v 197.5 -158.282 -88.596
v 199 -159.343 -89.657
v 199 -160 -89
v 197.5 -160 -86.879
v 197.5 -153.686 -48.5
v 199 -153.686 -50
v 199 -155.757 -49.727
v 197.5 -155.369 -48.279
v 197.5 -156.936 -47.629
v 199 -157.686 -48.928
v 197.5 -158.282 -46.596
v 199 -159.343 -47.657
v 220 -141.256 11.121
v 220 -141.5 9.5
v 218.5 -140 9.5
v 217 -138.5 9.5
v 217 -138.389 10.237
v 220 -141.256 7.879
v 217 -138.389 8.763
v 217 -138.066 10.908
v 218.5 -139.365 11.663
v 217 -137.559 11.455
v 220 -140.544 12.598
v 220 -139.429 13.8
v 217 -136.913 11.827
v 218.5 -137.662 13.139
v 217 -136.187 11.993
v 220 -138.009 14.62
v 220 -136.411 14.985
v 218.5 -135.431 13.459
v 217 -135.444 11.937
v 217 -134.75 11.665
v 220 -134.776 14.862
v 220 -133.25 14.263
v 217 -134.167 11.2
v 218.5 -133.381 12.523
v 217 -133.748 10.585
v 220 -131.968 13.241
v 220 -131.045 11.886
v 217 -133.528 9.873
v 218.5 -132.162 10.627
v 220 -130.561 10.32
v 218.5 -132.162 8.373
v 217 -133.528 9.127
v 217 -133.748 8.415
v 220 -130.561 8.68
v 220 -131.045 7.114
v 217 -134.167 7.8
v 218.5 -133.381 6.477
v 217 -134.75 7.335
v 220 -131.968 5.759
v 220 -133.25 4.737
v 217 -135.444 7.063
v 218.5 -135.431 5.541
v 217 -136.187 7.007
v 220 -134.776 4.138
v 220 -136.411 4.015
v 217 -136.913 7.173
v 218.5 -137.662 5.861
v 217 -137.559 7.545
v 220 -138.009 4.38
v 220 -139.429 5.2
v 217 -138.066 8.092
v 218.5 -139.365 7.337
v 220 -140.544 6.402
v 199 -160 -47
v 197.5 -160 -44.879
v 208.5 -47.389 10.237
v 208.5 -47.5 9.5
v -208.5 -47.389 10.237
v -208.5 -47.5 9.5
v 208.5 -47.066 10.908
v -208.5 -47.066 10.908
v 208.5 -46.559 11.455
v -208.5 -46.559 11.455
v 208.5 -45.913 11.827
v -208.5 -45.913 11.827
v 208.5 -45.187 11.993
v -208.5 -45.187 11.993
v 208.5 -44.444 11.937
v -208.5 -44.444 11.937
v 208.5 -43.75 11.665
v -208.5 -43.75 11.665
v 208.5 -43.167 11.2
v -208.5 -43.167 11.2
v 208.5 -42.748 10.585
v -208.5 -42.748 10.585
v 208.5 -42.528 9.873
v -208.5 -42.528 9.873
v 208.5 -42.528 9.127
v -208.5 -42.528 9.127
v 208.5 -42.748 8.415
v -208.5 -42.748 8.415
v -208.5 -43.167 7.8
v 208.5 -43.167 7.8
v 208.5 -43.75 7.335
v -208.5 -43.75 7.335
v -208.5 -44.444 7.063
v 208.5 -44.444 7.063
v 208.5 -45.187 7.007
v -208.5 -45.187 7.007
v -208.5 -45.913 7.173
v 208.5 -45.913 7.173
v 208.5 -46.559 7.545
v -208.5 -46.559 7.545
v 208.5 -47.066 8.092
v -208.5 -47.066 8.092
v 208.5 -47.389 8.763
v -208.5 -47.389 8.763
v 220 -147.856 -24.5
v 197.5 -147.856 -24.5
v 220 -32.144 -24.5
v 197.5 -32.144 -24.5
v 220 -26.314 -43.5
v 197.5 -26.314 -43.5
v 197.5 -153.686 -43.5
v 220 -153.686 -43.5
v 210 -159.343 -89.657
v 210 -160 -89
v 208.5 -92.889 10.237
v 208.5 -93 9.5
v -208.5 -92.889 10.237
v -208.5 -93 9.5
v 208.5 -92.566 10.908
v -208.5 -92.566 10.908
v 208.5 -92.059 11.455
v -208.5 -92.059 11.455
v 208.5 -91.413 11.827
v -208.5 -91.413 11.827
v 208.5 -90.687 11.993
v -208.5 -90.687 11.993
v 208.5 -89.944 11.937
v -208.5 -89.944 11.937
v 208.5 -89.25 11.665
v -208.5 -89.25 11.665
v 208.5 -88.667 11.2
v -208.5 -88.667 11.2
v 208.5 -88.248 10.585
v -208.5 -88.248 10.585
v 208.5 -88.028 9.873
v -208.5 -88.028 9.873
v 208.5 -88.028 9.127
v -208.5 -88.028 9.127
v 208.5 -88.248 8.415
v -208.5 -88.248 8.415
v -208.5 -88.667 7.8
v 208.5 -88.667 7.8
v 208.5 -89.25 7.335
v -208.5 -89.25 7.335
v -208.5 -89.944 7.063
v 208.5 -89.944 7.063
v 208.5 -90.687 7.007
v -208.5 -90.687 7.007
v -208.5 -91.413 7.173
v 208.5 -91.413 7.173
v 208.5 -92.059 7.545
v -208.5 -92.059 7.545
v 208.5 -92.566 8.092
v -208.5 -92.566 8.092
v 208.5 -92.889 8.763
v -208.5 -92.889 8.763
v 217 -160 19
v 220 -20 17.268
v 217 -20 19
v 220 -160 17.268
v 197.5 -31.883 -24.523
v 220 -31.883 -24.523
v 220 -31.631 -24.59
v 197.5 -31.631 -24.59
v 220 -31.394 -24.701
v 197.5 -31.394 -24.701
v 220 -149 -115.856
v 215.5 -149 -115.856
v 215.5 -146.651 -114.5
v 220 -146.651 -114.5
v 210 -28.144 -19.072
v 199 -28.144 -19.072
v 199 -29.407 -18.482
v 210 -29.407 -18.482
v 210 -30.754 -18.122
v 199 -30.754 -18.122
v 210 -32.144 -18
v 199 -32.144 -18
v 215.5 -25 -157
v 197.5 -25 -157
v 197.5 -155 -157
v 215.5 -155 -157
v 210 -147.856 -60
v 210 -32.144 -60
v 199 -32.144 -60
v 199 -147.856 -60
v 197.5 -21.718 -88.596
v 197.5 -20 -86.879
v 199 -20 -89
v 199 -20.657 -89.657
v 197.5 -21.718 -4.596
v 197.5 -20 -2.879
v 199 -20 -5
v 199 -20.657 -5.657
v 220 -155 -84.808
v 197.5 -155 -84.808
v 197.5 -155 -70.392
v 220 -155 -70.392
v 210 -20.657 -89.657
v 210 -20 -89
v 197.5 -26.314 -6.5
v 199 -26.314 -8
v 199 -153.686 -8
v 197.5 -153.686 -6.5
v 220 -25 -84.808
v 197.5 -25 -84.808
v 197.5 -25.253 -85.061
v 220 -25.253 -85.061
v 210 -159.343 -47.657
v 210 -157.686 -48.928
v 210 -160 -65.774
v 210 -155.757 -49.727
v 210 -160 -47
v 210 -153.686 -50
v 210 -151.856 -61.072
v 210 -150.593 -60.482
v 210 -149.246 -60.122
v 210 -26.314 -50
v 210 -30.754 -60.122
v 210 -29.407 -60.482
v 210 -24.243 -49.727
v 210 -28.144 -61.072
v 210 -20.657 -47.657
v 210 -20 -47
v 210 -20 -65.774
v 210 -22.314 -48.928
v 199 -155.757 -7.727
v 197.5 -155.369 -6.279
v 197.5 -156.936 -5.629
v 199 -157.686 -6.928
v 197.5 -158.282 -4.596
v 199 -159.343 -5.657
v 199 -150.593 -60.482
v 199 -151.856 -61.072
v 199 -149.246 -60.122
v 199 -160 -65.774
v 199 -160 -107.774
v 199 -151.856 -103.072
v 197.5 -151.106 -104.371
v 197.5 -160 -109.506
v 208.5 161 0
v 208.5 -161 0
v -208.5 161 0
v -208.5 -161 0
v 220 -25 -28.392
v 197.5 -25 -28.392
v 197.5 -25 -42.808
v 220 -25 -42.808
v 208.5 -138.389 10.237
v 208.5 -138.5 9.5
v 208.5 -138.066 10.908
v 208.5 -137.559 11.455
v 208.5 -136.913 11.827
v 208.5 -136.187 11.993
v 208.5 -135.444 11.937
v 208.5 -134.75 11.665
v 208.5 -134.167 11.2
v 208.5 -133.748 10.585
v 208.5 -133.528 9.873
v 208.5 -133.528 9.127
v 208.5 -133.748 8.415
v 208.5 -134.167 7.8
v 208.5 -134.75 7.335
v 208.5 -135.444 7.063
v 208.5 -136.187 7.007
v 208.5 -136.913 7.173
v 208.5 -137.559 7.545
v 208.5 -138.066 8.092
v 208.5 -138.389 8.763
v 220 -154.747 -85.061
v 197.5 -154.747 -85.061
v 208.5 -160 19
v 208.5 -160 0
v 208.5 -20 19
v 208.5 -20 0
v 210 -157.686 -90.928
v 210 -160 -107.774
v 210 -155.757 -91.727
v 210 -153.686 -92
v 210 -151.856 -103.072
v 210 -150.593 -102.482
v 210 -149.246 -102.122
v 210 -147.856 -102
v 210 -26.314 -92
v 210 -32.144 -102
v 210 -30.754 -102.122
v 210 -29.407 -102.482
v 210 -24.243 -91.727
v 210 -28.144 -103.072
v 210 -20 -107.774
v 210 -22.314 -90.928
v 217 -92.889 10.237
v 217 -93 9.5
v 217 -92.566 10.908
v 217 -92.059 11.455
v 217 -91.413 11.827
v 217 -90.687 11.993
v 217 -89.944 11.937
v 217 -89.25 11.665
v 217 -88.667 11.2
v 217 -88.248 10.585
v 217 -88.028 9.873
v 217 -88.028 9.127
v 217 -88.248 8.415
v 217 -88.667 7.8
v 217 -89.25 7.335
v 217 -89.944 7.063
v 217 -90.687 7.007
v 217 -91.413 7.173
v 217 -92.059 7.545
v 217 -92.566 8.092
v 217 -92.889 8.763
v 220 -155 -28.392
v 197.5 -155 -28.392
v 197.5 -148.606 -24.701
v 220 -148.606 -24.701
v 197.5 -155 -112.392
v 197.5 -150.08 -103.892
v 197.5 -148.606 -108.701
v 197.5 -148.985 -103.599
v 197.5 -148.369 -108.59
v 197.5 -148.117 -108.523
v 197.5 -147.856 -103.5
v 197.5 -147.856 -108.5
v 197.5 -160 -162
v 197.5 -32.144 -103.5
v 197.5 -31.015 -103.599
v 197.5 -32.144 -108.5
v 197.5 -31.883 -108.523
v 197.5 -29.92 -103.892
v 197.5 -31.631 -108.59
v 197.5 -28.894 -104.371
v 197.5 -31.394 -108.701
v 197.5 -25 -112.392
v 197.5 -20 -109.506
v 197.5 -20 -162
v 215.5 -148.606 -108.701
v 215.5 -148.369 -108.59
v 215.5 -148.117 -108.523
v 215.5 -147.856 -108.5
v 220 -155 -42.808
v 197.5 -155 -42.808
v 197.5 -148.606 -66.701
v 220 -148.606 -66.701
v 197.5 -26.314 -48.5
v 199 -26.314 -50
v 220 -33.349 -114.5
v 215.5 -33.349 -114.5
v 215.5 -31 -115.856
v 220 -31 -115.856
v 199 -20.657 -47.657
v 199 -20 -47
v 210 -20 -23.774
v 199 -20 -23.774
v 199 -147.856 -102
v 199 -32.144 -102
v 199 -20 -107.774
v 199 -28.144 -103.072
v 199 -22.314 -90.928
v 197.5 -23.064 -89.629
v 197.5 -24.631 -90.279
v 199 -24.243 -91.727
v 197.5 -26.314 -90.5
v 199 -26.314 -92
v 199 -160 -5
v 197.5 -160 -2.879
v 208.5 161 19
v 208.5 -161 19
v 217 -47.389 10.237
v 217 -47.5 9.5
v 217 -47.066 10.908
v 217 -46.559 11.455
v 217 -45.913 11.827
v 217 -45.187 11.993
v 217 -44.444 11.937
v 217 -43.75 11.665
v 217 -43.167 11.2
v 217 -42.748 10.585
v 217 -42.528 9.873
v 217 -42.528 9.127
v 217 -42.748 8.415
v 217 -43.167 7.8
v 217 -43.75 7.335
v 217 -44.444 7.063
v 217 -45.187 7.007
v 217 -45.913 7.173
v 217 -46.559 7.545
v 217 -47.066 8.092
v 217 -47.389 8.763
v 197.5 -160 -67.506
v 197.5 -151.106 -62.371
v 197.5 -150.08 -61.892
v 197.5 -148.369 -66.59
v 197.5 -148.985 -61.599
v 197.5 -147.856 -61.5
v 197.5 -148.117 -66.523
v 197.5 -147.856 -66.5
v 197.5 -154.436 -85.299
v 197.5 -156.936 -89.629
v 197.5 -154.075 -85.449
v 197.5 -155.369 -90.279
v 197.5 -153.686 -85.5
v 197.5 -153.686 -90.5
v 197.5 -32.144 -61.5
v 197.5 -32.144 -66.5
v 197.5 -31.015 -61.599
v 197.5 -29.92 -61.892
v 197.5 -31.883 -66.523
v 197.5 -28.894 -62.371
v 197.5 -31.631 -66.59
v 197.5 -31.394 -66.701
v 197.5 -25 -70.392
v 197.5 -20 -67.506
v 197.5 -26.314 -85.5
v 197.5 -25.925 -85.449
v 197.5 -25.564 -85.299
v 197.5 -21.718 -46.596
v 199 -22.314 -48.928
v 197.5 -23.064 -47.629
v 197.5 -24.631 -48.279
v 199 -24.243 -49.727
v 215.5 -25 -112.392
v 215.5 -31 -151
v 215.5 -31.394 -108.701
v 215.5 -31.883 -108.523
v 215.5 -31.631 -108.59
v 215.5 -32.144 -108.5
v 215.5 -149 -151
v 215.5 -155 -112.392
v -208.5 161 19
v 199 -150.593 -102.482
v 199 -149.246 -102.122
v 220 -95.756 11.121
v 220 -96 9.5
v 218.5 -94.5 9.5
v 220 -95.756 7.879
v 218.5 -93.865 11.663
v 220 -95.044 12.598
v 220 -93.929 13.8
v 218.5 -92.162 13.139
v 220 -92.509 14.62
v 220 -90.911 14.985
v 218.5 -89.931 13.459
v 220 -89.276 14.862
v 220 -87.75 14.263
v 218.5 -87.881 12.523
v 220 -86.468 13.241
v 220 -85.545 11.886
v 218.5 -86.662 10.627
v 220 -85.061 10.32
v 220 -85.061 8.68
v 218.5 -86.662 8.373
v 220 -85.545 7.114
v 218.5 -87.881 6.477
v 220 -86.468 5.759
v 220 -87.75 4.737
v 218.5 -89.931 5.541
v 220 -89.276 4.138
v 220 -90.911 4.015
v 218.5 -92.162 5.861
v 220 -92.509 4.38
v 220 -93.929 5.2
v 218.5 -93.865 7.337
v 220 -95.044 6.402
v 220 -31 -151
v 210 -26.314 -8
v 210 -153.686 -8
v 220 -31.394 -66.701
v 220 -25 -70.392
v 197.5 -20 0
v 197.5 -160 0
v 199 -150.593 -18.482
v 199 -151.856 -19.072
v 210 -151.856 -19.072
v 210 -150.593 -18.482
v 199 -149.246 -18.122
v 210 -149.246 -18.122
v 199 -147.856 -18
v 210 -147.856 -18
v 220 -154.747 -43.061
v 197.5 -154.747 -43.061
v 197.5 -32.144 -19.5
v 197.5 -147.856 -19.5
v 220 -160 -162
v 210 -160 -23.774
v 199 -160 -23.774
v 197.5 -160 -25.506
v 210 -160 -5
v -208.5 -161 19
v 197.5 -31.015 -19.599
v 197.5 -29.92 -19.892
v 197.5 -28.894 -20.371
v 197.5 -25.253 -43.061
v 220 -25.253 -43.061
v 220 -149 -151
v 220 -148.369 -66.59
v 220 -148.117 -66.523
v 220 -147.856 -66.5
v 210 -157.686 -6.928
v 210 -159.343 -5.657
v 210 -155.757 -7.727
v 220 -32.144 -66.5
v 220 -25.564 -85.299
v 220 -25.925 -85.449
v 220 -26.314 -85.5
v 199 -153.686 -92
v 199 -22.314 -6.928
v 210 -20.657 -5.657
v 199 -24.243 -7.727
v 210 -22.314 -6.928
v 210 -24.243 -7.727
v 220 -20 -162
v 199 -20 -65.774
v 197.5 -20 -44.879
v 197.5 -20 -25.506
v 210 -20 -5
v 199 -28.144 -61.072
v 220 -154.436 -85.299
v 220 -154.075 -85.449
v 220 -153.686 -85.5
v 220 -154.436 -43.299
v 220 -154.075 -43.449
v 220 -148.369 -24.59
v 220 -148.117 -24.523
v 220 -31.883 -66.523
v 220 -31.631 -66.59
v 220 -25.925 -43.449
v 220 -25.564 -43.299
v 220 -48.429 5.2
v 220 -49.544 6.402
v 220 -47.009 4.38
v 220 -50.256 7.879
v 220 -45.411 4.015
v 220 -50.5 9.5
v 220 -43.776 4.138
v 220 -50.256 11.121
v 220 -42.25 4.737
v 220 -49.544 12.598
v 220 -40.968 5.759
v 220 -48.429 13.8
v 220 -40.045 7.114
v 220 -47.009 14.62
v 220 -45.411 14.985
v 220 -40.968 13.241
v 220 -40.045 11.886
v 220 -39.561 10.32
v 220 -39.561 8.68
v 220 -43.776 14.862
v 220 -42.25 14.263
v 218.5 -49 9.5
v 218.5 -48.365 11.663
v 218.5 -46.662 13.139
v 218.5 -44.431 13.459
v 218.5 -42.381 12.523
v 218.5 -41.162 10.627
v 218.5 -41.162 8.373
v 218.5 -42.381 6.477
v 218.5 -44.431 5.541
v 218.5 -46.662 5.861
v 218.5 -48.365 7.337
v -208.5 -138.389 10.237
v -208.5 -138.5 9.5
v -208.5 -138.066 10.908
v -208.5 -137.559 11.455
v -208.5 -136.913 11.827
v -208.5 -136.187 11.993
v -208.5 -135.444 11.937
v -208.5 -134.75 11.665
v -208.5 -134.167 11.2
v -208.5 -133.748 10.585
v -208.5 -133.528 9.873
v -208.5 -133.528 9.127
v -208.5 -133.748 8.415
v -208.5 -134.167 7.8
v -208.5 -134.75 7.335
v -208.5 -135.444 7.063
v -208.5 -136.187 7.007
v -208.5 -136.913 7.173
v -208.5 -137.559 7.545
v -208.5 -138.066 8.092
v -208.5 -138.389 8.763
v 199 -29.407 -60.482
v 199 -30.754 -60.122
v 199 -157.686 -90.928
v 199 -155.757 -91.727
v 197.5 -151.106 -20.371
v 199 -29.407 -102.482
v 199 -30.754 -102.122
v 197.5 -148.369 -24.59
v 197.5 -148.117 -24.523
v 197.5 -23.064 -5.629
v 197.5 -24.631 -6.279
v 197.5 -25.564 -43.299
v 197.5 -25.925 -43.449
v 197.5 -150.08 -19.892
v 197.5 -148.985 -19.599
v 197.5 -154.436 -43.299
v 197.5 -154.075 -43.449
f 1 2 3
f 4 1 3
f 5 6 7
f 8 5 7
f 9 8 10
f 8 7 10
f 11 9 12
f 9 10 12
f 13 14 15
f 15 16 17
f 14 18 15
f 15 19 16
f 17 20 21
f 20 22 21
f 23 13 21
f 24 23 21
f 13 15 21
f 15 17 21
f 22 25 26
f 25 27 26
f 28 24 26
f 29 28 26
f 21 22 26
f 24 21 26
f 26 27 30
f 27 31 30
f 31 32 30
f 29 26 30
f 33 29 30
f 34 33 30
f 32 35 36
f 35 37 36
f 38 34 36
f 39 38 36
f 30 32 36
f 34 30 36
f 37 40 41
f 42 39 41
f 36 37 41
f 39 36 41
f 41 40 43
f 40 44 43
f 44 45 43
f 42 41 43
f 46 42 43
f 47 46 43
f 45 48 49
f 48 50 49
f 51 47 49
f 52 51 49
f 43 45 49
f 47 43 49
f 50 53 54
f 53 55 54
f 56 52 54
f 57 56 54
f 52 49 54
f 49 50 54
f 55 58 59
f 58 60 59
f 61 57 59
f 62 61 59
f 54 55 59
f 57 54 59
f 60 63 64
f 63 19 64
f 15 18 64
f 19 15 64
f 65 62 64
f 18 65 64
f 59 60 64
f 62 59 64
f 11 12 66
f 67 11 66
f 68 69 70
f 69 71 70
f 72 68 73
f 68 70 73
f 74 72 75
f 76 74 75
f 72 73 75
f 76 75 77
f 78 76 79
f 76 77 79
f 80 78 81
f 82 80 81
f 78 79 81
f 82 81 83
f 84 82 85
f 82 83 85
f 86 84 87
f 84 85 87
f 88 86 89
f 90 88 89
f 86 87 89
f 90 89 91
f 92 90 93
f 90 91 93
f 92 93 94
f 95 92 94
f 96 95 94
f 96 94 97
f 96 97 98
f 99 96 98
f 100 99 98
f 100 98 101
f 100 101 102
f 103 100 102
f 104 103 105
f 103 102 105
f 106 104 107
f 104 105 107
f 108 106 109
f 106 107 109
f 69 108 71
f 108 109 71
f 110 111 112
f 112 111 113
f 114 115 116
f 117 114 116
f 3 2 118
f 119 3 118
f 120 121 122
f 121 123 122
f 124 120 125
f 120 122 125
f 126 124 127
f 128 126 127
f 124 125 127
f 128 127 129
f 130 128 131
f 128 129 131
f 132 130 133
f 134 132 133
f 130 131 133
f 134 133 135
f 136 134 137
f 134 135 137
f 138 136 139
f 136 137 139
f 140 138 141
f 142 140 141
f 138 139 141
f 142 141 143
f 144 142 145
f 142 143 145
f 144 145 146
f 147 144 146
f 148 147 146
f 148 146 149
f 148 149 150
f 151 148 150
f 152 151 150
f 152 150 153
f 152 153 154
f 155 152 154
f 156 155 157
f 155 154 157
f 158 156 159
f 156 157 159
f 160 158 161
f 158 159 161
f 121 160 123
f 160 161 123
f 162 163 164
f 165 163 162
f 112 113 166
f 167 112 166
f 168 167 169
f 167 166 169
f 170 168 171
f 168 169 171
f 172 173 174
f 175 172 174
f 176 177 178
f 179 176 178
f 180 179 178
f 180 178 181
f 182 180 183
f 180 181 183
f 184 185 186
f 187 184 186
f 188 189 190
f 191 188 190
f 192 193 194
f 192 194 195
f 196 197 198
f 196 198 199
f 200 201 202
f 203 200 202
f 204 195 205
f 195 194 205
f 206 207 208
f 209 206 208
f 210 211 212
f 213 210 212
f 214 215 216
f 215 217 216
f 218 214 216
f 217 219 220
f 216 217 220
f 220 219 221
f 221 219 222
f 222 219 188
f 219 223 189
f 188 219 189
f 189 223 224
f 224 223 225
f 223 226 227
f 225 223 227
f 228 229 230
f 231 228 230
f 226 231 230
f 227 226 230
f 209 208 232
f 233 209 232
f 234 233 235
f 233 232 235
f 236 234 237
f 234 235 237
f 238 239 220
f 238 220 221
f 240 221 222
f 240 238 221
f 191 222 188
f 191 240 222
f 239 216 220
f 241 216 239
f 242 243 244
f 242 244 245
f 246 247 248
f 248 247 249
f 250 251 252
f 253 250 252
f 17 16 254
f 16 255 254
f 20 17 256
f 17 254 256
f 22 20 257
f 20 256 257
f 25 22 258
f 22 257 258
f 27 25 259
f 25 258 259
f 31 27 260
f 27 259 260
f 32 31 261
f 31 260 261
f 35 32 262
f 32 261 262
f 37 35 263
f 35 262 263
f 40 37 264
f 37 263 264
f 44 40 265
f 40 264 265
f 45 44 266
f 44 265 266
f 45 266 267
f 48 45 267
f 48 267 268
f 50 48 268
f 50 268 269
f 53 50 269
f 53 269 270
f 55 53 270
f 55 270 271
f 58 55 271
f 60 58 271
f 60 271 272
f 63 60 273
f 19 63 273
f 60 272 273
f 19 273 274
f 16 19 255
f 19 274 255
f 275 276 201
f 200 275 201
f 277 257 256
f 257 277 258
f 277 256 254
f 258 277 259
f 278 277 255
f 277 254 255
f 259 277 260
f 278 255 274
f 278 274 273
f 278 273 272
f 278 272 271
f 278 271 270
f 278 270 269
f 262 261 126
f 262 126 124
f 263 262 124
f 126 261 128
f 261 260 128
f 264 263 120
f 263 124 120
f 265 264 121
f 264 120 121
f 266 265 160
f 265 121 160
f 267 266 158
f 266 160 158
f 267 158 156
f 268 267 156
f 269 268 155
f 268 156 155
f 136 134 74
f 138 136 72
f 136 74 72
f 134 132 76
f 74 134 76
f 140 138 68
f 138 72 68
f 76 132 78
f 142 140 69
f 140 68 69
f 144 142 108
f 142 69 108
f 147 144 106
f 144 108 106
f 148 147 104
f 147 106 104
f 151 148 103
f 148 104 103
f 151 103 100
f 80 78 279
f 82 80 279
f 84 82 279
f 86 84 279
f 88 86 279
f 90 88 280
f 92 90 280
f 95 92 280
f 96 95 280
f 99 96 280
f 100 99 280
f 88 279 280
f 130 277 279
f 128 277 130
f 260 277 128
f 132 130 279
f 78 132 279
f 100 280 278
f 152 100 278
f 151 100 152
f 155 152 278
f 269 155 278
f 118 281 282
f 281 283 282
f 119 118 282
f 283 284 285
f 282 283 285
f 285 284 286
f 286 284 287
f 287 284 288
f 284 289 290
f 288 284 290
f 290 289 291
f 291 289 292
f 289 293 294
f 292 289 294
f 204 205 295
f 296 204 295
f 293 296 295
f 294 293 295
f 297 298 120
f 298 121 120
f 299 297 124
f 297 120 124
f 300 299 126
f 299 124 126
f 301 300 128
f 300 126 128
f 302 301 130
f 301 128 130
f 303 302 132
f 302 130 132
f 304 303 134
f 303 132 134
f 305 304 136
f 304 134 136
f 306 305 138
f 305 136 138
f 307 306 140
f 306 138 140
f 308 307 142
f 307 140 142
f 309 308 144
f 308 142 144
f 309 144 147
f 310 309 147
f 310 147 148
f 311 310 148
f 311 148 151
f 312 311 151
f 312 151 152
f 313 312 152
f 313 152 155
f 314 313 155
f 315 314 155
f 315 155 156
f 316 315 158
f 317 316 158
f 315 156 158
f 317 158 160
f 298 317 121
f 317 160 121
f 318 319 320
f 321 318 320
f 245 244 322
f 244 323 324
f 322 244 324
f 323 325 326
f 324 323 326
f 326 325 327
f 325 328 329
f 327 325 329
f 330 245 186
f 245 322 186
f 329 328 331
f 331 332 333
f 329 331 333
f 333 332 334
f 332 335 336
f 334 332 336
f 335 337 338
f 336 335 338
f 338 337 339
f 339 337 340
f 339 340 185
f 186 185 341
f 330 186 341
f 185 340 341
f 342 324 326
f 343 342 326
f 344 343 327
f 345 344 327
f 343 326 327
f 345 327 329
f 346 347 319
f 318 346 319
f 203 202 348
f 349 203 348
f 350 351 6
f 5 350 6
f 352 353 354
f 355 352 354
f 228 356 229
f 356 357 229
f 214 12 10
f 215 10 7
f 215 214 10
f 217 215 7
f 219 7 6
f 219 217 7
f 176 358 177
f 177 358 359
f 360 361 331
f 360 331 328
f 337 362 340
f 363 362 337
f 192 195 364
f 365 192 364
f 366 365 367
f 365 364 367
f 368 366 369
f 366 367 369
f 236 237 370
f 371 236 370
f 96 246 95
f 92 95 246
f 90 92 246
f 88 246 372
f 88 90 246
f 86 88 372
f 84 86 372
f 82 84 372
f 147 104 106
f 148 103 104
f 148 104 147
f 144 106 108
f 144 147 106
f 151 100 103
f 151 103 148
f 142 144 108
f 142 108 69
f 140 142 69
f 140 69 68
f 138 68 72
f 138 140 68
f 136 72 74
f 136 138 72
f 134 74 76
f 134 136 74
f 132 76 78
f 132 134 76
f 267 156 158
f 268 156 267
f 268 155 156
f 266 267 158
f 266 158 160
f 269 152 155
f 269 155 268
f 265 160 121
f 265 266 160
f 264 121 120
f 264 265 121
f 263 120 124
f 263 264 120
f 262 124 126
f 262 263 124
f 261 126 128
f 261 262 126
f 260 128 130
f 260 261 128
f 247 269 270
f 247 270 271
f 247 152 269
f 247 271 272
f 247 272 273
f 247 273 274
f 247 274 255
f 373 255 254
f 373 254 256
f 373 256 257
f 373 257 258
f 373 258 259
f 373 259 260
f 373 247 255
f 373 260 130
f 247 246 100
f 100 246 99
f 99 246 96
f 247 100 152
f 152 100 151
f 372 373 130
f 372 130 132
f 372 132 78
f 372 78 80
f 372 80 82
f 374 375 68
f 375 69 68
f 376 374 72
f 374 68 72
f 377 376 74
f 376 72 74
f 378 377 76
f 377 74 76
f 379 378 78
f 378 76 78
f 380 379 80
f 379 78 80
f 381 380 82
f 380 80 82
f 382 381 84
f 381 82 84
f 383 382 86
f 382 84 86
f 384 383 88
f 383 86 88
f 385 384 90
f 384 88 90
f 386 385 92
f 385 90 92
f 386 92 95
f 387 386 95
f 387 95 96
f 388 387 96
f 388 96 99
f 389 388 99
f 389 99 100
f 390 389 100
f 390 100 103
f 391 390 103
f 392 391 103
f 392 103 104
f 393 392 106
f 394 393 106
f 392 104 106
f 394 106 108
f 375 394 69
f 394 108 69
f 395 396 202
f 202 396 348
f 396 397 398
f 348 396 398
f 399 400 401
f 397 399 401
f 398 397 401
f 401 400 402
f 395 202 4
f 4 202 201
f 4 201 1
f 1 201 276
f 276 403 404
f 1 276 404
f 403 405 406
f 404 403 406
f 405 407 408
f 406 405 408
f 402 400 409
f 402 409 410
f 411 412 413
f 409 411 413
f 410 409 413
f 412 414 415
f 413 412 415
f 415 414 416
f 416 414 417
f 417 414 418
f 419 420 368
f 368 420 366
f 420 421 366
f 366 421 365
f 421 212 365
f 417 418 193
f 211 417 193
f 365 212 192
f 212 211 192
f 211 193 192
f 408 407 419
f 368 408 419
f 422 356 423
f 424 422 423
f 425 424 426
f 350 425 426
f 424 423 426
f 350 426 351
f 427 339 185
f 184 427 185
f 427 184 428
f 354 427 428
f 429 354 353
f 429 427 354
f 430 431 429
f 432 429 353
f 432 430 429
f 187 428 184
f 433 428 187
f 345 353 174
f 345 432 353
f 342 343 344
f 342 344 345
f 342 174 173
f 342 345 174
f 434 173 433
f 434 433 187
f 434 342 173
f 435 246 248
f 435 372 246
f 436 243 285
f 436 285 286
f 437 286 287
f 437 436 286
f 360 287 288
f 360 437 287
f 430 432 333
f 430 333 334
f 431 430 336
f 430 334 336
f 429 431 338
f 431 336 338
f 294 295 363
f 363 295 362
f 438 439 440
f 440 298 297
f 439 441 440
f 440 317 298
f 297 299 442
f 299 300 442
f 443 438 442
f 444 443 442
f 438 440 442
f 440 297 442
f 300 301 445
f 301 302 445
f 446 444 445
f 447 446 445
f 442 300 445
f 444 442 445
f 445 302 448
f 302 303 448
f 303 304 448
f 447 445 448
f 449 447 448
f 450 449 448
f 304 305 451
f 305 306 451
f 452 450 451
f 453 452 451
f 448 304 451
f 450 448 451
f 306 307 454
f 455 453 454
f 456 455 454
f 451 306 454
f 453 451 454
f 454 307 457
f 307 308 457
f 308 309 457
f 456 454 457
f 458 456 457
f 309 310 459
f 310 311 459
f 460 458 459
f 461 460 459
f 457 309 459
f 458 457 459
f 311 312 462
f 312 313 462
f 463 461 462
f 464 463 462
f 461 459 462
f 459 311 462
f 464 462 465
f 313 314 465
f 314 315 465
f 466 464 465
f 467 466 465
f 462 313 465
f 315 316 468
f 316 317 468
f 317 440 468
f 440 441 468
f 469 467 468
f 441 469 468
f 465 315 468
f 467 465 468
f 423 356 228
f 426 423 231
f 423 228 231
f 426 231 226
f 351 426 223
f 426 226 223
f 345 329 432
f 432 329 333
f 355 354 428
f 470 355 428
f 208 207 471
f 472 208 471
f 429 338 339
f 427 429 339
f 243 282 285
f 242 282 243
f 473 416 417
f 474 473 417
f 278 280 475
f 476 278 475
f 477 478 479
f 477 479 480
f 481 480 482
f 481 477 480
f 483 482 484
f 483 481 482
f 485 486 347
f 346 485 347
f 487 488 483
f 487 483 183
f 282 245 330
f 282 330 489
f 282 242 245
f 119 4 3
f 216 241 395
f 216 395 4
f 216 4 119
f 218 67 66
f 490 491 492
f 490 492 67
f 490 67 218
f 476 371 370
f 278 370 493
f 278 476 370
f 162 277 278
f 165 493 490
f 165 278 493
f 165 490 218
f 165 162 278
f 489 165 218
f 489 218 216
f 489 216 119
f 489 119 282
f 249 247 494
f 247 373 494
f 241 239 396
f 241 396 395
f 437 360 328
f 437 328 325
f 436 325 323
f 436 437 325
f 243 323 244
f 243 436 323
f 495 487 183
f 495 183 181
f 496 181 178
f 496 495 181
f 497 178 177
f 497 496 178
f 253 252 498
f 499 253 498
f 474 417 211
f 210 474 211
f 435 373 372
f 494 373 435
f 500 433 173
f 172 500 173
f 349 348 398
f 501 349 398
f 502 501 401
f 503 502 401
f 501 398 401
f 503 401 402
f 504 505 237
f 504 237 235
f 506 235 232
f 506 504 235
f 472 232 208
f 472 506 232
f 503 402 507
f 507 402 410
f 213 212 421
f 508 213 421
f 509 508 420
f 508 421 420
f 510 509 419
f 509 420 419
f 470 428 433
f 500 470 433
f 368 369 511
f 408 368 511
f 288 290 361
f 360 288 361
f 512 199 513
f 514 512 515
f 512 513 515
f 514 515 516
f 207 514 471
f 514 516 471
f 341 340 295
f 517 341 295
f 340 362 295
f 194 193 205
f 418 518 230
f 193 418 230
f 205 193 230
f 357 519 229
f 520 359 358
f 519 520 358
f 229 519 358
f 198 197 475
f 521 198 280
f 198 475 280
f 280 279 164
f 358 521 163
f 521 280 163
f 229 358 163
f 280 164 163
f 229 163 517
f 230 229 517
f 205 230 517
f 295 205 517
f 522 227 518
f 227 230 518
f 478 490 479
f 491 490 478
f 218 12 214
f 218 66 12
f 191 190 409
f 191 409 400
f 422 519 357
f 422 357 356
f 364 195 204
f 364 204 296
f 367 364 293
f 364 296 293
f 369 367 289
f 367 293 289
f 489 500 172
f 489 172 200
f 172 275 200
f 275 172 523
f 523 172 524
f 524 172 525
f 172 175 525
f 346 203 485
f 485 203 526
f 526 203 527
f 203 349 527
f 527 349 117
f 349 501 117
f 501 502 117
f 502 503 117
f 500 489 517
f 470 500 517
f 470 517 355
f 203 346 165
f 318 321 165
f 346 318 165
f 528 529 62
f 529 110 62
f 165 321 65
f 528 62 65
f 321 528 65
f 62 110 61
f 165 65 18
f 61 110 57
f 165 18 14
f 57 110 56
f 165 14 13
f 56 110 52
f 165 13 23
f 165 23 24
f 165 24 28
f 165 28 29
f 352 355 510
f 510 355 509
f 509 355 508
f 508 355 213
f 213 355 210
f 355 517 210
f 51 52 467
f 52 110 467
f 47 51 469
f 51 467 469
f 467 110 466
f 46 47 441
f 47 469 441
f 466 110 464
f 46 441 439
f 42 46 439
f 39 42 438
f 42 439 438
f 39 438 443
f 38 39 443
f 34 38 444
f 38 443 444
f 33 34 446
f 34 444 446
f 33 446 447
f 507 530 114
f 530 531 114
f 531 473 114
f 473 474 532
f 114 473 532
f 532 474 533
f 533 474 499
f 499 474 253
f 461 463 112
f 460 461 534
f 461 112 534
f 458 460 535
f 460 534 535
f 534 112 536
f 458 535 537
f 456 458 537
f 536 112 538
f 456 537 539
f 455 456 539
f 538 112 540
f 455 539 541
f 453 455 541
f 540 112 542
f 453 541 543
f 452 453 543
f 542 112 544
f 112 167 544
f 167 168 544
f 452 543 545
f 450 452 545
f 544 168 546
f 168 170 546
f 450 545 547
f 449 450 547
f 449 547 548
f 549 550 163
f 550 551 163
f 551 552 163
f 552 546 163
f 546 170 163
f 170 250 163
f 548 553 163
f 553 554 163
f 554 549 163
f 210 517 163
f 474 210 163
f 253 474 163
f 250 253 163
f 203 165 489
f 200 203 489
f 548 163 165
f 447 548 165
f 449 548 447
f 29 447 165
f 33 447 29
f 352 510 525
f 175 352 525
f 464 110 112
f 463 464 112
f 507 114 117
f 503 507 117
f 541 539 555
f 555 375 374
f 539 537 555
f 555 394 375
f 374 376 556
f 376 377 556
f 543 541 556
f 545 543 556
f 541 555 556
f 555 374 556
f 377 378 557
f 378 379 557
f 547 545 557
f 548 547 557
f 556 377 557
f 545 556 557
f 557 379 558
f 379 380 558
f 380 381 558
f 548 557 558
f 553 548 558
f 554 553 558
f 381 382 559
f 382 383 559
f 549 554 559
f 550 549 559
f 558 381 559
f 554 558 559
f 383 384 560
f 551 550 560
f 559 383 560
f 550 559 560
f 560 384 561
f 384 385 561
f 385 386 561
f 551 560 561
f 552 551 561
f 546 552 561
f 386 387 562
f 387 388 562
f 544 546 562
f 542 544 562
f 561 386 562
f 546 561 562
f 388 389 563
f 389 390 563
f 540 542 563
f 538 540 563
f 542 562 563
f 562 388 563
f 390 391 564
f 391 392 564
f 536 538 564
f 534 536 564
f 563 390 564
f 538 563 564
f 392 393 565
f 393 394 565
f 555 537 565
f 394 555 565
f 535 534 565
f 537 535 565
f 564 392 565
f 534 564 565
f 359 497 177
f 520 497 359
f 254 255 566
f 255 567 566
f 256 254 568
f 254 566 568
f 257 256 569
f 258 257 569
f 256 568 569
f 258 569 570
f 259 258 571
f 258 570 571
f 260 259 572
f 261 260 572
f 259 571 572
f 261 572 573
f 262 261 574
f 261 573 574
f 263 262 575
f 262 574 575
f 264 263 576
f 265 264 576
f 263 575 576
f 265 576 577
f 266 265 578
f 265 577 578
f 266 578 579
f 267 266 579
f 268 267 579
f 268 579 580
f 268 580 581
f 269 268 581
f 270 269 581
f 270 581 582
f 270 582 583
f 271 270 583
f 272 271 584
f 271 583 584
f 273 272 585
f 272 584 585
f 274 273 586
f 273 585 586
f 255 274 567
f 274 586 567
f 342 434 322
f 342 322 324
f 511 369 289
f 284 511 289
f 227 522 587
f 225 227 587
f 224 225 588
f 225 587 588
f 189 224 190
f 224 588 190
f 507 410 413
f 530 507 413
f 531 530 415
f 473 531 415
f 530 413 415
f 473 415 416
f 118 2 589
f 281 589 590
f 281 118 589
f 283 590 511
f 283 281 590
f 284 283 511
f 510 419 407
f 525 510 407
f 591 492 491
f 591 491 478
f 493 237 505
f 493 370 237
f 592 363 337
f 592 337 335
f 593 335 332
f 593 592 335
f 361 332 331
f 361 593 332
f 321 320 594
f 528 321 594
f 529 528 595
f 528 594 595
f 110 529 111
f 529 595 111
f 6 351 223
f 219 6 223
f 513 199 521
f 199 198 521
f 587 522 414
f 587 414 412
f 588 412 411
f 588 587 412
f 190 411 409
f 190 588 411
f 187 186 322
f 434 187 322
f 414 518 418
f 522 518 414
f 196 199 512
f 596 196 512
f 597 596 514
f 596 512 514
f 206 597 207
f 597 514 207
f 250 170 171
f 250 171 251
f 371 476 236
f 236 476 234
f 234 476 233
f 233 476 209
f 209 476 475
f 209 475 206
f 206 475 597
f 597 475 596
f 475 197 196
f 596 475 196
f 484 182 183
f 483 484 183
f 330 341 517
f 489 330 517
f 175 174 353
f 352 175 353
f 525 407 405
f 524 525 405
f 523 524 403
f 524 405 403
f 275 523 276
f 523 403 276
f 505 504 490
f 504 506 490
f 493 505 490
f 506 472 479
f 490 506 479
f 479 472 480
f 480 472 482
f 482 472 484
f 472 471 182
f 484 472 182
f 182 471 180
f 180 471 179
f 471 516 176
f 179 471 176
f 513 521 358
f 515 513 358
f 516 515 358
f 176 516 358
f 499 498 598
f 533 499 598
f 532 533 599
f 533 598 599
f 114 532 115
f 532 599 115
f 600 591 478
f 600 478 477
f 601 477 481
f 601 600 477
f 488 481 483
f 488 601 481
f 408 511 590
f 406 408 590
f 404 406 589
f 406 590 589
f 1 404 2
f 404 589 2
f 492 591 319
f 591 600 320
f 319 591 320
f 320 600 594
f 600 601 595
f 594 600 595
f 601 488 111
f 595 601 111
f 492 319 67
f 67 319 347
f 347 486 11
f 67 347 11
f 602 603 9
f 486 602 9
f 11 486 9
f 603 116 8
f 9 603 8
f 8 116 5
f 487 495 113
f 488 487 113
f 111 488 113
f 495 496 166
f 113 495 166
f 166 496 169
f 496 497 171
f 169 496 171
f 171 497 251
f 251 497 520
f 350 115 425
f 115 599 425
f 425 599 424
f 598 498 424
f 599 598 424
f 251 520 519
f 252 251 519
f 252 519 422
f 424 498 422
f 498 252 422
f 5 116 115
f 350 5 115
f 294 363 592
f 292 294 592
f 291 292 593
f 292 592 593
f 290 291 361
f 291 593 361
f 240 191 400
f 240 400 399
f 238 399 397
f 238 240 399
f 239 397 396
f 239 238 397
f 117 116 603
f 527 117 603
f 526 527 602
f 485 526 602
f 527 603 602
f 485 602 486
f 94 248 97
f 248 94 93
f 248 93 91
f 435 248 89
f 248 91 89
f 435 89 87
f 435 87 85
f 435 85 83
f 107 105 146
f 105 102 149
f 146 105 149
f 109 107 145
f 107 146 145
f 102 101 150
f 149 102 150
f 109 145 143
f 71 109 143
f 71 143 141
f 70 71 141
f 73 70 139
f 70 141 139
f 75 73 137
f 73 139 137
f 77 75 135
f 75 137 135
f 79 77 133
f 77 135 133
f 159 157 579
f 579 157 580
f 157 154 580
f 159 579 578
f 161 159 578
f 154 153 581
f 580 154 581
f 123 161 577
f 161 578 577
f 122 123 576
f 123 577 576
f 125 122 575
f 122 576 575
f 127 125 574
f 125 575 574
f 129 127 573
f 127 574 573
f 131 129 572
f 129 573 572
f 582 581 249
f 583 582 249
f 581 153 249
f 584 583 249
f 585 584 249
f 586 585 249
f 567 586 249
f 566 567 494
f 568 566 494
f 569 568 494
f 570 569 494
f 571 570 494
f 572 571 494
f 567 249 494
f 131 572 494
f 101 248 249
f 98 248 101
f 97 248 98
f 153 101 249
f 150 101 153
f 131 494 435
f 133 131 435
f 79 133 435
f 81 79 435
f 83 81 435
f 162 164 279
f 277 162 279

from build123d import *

# Parameters (mm, degrees)
F0_W              = 208.5
F0_H              = 19
F1_DEPTH          = 161
F5_START          = 20
F5_DEPTH          = 140
F6_SIZE2          = 5.7735026919
F6_SIZE           = 10
F6_2_SIZE2        = 5.7735026919
F6_2_SIZE         = 10
F6_3_SIZE2        = 5.7735026919
F6_3_SIZE         = 10
F7_SIZE2          = 5.7735026919
F7_SIZE           = 10
F7_2_SIZE2        = 5.7735026919
F7_2_SIZE         = 10
F7_3_SIZE2        = 5.7735026919
F7_3_SIZE         = 10
F8_SIZE           = 3
F9_SIZE2          = 1.7320508076
F9_SIZE           = 3
F10_R             = 8
F11_SIZE          = 1.5
F13_DEPTH         = 22.5
F15_D             = 5
F15_CSINK_D       = 11
F15_CSINK_ANGLE   = 90
F15_2_D           = 5
F15_2_CSINK_D     = 11
F15_2_CSINK_ANGLE = 90
F16_DEPTH         = 18
F18_DEPTH         = 22.501


with BuildPart() as f1:
    # F0 (on Front) → F1 (new body)
    with BuildSketch(Plane.XZ):
        with Locations((104.25, 9.5)):
            Rectangle(F0_W, F0_H)
    extrude(amount=F1_DEPTH)

    # F2: F1 across face


with BuildPart() as f1_1:
    add(f1.part)
    add(f1.part.mirror(Plane(origin=(104.25, 0, 9.5), x_dir=(1, 0, 0), z_dir=(0, 1, 0))))

    # F3: F1 across face


with BuildPart() as f1_2:
    add(f1_1.part)
    add(f1_1.part.mirror(Plane(origin=(0, 0, 9.5), x_dir=(0, -1, 0), z_dir=(-1, 0, 0))))

    # F15 (through all)
    with Locations(Plane.YZ.offset(220)):
        with Locations((-136, 9.5), (-90.5, 9.5), (-45, 9.5)):
            CounterSinkHole(F15_D / 2, F15_CSINK_D / 2, counter_sink_angle=F15_CSINK_ANGLE)


with BuildPart() as f5:
    # F4 (on Front) → F5 (new body)
    with BuildSketch(Plane.XZ.offset(F5_START)):
        Polygon((220, 19), (208.5, 19), (208.5, 0), (197.5, 0), (197.5, -8), (210, -8), (210, -18), (197.5, -18), (197.5, -50), (210, -50), (210, -60), (197.5, -60), (197.5, -92), (210, -92), (210, -102), (197.5, -102), (197.5, -162), (220, -162), align=None)
    extrude(amount=F5_DEPTH)

    # F6
    f6_edges = [f5.edges().sort_by_distance(p)[0] for p in [
        (203.75, -160, -18),
    ]]
    f6_side = f5.faces().sort_by_distance((203.75, -90, -18))[0]
    chamfer(f6_edges, length=F6_SIZE, length2=F6_SIZE2, reference=f6_side)

    # F6#2
    f6_2_edges = [f5.edges().sort_by_distance(p)[0] for p in [
        (203.75, -160, -60),
    ]]
    f6_2_side = f5.faces().sort_by_distance((203.75, -90, -60))[0]
    chamfer(f6_2_edges, length=F6_2_SIZE, length2=F6_2_SIZE2, reference=f6_2_side)

    # F6#3
    f6_3_edges = [f5.edges().sort_by_distance(p)[0] for p in [
        (203.75, -160, -102),
    ]]
    f6_3_side = f5.faces().sort_by_distance((203.75, -90, -102))[0]
    chamfer(f6_3_edges, length=F6_3_SIZE, length2=F6_3_SIZE2, reference=f6_3_side)

    # F7
    f7_edges = [f5.edges().sort_by_distance(p)[0] for p in [
        (203.75, -20, -18),
    ]]
    f7_side = f5.faces().sort_by_distance((203.75, -85, -18))[0]
    chamfer(f7_edges, length=F7_SIZE, length2=F7_SIZE2, reference=f7_side)

    # F7#2
    f7_2_edges = [f5.edges().sort_by_distance(p)[0] for p in [
        (203.75, -20, -60),
    ]]
    f7_2_side = f5.faces().sort_by_distance((203.75, -85, -60))[0]
    chamfer(f7_2_edges, length=F7_2_SIZE, length2=F7_2_SIZE2, reference=f7_2_side)

    # F7#3
    f7_3_edges = [f5.edges().sort_by_distance(p)[0] for p in [
        (203.75, -20, -102),
    ]]
    f7_3_side = f5.faces().sort_by_distance((203.75, -85, -102))[0]
    chamfer(f7_3_edges, length=F7_3_SIZE, length2=F7_3_SIZE2, reference=f7_3_side)

    # F8
    f8_edges = [f5.edges().sort_by_distance(p)[0] for p in [
        (203.75, -20, -8),
        (203.75, -20, -50),
        (203.75, -20, -92),
        (203.75, -160, -92),
        (203.75, -160, -50),
        (203.75, -160, -8),
    ]]
    chamfer(f8_edges, length=F8_SIZE)

    # F9
    f9_edges = [f5.edges().sort_by_distance(p)[0] for p in [
        (220, -90, 19),
    ]]
    f9_side = f5.faces().sort_by_distance((214.25, -90, 19))[0]
    chamfer(f9_edges, length=F9_SIZE, length2=F9_SIZE2, reference=f9_side)

    # F10
    f10_edges = [f5.edges().sort_by_distance(p)[0] for p in [
        (203.75, -30, -102),
        (203.75, -150, -102),
        (203.75, -150, -60),
        (203.75, -150, -18),
        (203.75, -30, -60),
        (203.75, -30, -18),
        (203.75, -23, -8),
        (203.75, -157, -8),
        (203.75, -23, -50),
        (203.75, -23, -92),
        (203.75, -157, -92),
        (203.75, -157, -50),
    ]]
    fillet(f10_edges, radius=F10_R)

    # F11
    f11_edges = [f5.edges().sort_by_distance(p)[0] for p in [
        (197.5, -24.071797, -21.42265),
        (197.5, -90, -8),
        (197.5, -90, -50),
        (197.5, -90, -60),
        (197.5, -90, -102),
        (197.5, -90, -92),
    ]]
    chamfer(f11_edges, length=F11_SIZE)

    # F12 (on face) → F13 (cut, through all)
    with BuildSketch(Plane(origin=(197.5, 0, 0), x_dir=(0, -1, 0), z_dir=(-1, 0, 0))):
        with BuildLine():
            ThreePointArc((25.2530472132, -43.0606612857), (25.7396827476, -43.3858207542), (26.313708499, -43.5000015754))
            Line((26.313708499, -43.5000015754), (153.686291501, -43.5000015754))
            ThreePointArc((153.686291501, -43.5000015754), (154.2603172524, -43.3858207542), (154.7469527868, -43.0606612857))
            Line((154.7469527868, -43.0606612857), (155.0000015754, -42.8076124971))
            Line((155.0000015754, -42.8076124971), (155.0000015754, -28.3923039359))
            Line((155.0000015754, -28.3923039359), (148.6064072482, -24.70096053))
            ThreePointArc((148.6064072482, -24.70096053), (148.2446354359, -24.5511097389), (147.8564064606, -24.4999984246))
            Line((147.8564064606, -24.4999984246), (32.1435935394, -24.4999984246))
            ThreePointArc((32.1435935394, -24.4999984246), (31.7553645641, -24.5511097389), (31.3935927518, -24.70096053))
            Line((31.3935927518, -24.70096053), (24.9999984246, -28.3923039359))
            Line((24.9999984246, -28.3923039359), (24.9999984246, -42.8076124971))
            Line((24.9999984246, -42.8076124971), (25.2530472132, -43.0606612857))
        make_face()
        with BuildLine():
            ThreePointArc((25.2530451495, -85.0606633495), (25.7396816307, -85.3858234506), (26.313708499, -85.5000044939))
            Line((26.313708499, -85.5000044939), (153.686291501, -85.5000044939))
            ThreePointArc((153.686291501, -85.5000044939), (154.2603183693, -85.3858234506), (154.7469548505, -85.0606633495))
            Line((154.7469548505, -85.0606633495), (155.0000044939, -84.807613706))
            Line((155.0000044939, -84.807613706), (155.0000044939, -70.3923022508))
            Line((155.0000044939, -70.3923022508), (148.6064087075, -66.7009580025))
            ThreePointArc((148.6064087075, -66.7009580025), (148.2446361913, -66.5511069197), (147.8564064606, -66.4999955061))
            Line((147.8564064606, -66.4999955061), (32.1435935394, -66.4999955061))
            ThreePointArc((32.1435935394, -66.4999955061), (31.7553638087, -66.5511069197), (31.3935912925, -66.7009580025))
            Line((31.3935912925, -66.7009580025), (24.9999955061, -70.3923022508))
            Line((24.9999955061, -70.3923022508), (24.9999955061, -84.807613706))
            Line((24.9999955061, -84.807613706), (25.2530451495, -85.0606633495))
        make_face()
    extrude(amount=-F13_DEPTH, mode=Mode.SUBTRACT)

    # F15#2 (through all)
    with Locations(Plane.YZ.offset(220)):
        with Locations((-136, 9.5), (-90.5, 9.5), (-45, 9.5)):
            CounterSinkHole(F15_2_D / 2, F15_2_CSINK_D / 2, counter_sink_angle=F15_2_CSINK_ANGLE)

    # F12 (on face) → F16 (cut)
    with BuildSketch(Plane(origin=(197.5, 0, 0), x_dir=(0, -1, 0), z_dir=(-1, 0, 0))):
        with BuildLine():
            Line((25, -112.3923048454), (25, -157))
            Line((25, -157), (155, -157))
            Line((155, -157), (155, -112.3923048454))
            Line((155, -112.3923048454), (148.6064064606, -108.7009618943))
            ThreePointArc((148.6064064606, -108.7009618943), (148.2446350282, -108.5511112606), (147.8564064606, -108.5))
            Line((147.8564064606, -108.5), (32.1435935394, -108.5))
            ThreePointArc((32.1435935394, -108.5), (31.7553649718, -108.5511112606), (31.3935935394, -108.7009618943))
            Line((31.3935935394, -108.7009618943), (25, -112.3923048454))
        make_face()
    extrude(amount=-F16_DEPTH, mode=Mode.SUBTRACT)

    # F17 (on face) → F18 (cut, through all)
    with BuildSketch(Plane(origin=(197.5, 0, 0), x_dir=(0, -1, 0), z_dir=(-1, 0, 0))):
        Polygon((149, -151), (149, -115.8564064606), (146.6506350946, -114.5), (33.3493649054, -114.5), (31, -115.8564064606), (31, -151), align=None)
    extrude(amount=-F18_DEPTH, mode=Mode.SUBTRACT)


solid = Compound([f1_2.part, f5.part])
